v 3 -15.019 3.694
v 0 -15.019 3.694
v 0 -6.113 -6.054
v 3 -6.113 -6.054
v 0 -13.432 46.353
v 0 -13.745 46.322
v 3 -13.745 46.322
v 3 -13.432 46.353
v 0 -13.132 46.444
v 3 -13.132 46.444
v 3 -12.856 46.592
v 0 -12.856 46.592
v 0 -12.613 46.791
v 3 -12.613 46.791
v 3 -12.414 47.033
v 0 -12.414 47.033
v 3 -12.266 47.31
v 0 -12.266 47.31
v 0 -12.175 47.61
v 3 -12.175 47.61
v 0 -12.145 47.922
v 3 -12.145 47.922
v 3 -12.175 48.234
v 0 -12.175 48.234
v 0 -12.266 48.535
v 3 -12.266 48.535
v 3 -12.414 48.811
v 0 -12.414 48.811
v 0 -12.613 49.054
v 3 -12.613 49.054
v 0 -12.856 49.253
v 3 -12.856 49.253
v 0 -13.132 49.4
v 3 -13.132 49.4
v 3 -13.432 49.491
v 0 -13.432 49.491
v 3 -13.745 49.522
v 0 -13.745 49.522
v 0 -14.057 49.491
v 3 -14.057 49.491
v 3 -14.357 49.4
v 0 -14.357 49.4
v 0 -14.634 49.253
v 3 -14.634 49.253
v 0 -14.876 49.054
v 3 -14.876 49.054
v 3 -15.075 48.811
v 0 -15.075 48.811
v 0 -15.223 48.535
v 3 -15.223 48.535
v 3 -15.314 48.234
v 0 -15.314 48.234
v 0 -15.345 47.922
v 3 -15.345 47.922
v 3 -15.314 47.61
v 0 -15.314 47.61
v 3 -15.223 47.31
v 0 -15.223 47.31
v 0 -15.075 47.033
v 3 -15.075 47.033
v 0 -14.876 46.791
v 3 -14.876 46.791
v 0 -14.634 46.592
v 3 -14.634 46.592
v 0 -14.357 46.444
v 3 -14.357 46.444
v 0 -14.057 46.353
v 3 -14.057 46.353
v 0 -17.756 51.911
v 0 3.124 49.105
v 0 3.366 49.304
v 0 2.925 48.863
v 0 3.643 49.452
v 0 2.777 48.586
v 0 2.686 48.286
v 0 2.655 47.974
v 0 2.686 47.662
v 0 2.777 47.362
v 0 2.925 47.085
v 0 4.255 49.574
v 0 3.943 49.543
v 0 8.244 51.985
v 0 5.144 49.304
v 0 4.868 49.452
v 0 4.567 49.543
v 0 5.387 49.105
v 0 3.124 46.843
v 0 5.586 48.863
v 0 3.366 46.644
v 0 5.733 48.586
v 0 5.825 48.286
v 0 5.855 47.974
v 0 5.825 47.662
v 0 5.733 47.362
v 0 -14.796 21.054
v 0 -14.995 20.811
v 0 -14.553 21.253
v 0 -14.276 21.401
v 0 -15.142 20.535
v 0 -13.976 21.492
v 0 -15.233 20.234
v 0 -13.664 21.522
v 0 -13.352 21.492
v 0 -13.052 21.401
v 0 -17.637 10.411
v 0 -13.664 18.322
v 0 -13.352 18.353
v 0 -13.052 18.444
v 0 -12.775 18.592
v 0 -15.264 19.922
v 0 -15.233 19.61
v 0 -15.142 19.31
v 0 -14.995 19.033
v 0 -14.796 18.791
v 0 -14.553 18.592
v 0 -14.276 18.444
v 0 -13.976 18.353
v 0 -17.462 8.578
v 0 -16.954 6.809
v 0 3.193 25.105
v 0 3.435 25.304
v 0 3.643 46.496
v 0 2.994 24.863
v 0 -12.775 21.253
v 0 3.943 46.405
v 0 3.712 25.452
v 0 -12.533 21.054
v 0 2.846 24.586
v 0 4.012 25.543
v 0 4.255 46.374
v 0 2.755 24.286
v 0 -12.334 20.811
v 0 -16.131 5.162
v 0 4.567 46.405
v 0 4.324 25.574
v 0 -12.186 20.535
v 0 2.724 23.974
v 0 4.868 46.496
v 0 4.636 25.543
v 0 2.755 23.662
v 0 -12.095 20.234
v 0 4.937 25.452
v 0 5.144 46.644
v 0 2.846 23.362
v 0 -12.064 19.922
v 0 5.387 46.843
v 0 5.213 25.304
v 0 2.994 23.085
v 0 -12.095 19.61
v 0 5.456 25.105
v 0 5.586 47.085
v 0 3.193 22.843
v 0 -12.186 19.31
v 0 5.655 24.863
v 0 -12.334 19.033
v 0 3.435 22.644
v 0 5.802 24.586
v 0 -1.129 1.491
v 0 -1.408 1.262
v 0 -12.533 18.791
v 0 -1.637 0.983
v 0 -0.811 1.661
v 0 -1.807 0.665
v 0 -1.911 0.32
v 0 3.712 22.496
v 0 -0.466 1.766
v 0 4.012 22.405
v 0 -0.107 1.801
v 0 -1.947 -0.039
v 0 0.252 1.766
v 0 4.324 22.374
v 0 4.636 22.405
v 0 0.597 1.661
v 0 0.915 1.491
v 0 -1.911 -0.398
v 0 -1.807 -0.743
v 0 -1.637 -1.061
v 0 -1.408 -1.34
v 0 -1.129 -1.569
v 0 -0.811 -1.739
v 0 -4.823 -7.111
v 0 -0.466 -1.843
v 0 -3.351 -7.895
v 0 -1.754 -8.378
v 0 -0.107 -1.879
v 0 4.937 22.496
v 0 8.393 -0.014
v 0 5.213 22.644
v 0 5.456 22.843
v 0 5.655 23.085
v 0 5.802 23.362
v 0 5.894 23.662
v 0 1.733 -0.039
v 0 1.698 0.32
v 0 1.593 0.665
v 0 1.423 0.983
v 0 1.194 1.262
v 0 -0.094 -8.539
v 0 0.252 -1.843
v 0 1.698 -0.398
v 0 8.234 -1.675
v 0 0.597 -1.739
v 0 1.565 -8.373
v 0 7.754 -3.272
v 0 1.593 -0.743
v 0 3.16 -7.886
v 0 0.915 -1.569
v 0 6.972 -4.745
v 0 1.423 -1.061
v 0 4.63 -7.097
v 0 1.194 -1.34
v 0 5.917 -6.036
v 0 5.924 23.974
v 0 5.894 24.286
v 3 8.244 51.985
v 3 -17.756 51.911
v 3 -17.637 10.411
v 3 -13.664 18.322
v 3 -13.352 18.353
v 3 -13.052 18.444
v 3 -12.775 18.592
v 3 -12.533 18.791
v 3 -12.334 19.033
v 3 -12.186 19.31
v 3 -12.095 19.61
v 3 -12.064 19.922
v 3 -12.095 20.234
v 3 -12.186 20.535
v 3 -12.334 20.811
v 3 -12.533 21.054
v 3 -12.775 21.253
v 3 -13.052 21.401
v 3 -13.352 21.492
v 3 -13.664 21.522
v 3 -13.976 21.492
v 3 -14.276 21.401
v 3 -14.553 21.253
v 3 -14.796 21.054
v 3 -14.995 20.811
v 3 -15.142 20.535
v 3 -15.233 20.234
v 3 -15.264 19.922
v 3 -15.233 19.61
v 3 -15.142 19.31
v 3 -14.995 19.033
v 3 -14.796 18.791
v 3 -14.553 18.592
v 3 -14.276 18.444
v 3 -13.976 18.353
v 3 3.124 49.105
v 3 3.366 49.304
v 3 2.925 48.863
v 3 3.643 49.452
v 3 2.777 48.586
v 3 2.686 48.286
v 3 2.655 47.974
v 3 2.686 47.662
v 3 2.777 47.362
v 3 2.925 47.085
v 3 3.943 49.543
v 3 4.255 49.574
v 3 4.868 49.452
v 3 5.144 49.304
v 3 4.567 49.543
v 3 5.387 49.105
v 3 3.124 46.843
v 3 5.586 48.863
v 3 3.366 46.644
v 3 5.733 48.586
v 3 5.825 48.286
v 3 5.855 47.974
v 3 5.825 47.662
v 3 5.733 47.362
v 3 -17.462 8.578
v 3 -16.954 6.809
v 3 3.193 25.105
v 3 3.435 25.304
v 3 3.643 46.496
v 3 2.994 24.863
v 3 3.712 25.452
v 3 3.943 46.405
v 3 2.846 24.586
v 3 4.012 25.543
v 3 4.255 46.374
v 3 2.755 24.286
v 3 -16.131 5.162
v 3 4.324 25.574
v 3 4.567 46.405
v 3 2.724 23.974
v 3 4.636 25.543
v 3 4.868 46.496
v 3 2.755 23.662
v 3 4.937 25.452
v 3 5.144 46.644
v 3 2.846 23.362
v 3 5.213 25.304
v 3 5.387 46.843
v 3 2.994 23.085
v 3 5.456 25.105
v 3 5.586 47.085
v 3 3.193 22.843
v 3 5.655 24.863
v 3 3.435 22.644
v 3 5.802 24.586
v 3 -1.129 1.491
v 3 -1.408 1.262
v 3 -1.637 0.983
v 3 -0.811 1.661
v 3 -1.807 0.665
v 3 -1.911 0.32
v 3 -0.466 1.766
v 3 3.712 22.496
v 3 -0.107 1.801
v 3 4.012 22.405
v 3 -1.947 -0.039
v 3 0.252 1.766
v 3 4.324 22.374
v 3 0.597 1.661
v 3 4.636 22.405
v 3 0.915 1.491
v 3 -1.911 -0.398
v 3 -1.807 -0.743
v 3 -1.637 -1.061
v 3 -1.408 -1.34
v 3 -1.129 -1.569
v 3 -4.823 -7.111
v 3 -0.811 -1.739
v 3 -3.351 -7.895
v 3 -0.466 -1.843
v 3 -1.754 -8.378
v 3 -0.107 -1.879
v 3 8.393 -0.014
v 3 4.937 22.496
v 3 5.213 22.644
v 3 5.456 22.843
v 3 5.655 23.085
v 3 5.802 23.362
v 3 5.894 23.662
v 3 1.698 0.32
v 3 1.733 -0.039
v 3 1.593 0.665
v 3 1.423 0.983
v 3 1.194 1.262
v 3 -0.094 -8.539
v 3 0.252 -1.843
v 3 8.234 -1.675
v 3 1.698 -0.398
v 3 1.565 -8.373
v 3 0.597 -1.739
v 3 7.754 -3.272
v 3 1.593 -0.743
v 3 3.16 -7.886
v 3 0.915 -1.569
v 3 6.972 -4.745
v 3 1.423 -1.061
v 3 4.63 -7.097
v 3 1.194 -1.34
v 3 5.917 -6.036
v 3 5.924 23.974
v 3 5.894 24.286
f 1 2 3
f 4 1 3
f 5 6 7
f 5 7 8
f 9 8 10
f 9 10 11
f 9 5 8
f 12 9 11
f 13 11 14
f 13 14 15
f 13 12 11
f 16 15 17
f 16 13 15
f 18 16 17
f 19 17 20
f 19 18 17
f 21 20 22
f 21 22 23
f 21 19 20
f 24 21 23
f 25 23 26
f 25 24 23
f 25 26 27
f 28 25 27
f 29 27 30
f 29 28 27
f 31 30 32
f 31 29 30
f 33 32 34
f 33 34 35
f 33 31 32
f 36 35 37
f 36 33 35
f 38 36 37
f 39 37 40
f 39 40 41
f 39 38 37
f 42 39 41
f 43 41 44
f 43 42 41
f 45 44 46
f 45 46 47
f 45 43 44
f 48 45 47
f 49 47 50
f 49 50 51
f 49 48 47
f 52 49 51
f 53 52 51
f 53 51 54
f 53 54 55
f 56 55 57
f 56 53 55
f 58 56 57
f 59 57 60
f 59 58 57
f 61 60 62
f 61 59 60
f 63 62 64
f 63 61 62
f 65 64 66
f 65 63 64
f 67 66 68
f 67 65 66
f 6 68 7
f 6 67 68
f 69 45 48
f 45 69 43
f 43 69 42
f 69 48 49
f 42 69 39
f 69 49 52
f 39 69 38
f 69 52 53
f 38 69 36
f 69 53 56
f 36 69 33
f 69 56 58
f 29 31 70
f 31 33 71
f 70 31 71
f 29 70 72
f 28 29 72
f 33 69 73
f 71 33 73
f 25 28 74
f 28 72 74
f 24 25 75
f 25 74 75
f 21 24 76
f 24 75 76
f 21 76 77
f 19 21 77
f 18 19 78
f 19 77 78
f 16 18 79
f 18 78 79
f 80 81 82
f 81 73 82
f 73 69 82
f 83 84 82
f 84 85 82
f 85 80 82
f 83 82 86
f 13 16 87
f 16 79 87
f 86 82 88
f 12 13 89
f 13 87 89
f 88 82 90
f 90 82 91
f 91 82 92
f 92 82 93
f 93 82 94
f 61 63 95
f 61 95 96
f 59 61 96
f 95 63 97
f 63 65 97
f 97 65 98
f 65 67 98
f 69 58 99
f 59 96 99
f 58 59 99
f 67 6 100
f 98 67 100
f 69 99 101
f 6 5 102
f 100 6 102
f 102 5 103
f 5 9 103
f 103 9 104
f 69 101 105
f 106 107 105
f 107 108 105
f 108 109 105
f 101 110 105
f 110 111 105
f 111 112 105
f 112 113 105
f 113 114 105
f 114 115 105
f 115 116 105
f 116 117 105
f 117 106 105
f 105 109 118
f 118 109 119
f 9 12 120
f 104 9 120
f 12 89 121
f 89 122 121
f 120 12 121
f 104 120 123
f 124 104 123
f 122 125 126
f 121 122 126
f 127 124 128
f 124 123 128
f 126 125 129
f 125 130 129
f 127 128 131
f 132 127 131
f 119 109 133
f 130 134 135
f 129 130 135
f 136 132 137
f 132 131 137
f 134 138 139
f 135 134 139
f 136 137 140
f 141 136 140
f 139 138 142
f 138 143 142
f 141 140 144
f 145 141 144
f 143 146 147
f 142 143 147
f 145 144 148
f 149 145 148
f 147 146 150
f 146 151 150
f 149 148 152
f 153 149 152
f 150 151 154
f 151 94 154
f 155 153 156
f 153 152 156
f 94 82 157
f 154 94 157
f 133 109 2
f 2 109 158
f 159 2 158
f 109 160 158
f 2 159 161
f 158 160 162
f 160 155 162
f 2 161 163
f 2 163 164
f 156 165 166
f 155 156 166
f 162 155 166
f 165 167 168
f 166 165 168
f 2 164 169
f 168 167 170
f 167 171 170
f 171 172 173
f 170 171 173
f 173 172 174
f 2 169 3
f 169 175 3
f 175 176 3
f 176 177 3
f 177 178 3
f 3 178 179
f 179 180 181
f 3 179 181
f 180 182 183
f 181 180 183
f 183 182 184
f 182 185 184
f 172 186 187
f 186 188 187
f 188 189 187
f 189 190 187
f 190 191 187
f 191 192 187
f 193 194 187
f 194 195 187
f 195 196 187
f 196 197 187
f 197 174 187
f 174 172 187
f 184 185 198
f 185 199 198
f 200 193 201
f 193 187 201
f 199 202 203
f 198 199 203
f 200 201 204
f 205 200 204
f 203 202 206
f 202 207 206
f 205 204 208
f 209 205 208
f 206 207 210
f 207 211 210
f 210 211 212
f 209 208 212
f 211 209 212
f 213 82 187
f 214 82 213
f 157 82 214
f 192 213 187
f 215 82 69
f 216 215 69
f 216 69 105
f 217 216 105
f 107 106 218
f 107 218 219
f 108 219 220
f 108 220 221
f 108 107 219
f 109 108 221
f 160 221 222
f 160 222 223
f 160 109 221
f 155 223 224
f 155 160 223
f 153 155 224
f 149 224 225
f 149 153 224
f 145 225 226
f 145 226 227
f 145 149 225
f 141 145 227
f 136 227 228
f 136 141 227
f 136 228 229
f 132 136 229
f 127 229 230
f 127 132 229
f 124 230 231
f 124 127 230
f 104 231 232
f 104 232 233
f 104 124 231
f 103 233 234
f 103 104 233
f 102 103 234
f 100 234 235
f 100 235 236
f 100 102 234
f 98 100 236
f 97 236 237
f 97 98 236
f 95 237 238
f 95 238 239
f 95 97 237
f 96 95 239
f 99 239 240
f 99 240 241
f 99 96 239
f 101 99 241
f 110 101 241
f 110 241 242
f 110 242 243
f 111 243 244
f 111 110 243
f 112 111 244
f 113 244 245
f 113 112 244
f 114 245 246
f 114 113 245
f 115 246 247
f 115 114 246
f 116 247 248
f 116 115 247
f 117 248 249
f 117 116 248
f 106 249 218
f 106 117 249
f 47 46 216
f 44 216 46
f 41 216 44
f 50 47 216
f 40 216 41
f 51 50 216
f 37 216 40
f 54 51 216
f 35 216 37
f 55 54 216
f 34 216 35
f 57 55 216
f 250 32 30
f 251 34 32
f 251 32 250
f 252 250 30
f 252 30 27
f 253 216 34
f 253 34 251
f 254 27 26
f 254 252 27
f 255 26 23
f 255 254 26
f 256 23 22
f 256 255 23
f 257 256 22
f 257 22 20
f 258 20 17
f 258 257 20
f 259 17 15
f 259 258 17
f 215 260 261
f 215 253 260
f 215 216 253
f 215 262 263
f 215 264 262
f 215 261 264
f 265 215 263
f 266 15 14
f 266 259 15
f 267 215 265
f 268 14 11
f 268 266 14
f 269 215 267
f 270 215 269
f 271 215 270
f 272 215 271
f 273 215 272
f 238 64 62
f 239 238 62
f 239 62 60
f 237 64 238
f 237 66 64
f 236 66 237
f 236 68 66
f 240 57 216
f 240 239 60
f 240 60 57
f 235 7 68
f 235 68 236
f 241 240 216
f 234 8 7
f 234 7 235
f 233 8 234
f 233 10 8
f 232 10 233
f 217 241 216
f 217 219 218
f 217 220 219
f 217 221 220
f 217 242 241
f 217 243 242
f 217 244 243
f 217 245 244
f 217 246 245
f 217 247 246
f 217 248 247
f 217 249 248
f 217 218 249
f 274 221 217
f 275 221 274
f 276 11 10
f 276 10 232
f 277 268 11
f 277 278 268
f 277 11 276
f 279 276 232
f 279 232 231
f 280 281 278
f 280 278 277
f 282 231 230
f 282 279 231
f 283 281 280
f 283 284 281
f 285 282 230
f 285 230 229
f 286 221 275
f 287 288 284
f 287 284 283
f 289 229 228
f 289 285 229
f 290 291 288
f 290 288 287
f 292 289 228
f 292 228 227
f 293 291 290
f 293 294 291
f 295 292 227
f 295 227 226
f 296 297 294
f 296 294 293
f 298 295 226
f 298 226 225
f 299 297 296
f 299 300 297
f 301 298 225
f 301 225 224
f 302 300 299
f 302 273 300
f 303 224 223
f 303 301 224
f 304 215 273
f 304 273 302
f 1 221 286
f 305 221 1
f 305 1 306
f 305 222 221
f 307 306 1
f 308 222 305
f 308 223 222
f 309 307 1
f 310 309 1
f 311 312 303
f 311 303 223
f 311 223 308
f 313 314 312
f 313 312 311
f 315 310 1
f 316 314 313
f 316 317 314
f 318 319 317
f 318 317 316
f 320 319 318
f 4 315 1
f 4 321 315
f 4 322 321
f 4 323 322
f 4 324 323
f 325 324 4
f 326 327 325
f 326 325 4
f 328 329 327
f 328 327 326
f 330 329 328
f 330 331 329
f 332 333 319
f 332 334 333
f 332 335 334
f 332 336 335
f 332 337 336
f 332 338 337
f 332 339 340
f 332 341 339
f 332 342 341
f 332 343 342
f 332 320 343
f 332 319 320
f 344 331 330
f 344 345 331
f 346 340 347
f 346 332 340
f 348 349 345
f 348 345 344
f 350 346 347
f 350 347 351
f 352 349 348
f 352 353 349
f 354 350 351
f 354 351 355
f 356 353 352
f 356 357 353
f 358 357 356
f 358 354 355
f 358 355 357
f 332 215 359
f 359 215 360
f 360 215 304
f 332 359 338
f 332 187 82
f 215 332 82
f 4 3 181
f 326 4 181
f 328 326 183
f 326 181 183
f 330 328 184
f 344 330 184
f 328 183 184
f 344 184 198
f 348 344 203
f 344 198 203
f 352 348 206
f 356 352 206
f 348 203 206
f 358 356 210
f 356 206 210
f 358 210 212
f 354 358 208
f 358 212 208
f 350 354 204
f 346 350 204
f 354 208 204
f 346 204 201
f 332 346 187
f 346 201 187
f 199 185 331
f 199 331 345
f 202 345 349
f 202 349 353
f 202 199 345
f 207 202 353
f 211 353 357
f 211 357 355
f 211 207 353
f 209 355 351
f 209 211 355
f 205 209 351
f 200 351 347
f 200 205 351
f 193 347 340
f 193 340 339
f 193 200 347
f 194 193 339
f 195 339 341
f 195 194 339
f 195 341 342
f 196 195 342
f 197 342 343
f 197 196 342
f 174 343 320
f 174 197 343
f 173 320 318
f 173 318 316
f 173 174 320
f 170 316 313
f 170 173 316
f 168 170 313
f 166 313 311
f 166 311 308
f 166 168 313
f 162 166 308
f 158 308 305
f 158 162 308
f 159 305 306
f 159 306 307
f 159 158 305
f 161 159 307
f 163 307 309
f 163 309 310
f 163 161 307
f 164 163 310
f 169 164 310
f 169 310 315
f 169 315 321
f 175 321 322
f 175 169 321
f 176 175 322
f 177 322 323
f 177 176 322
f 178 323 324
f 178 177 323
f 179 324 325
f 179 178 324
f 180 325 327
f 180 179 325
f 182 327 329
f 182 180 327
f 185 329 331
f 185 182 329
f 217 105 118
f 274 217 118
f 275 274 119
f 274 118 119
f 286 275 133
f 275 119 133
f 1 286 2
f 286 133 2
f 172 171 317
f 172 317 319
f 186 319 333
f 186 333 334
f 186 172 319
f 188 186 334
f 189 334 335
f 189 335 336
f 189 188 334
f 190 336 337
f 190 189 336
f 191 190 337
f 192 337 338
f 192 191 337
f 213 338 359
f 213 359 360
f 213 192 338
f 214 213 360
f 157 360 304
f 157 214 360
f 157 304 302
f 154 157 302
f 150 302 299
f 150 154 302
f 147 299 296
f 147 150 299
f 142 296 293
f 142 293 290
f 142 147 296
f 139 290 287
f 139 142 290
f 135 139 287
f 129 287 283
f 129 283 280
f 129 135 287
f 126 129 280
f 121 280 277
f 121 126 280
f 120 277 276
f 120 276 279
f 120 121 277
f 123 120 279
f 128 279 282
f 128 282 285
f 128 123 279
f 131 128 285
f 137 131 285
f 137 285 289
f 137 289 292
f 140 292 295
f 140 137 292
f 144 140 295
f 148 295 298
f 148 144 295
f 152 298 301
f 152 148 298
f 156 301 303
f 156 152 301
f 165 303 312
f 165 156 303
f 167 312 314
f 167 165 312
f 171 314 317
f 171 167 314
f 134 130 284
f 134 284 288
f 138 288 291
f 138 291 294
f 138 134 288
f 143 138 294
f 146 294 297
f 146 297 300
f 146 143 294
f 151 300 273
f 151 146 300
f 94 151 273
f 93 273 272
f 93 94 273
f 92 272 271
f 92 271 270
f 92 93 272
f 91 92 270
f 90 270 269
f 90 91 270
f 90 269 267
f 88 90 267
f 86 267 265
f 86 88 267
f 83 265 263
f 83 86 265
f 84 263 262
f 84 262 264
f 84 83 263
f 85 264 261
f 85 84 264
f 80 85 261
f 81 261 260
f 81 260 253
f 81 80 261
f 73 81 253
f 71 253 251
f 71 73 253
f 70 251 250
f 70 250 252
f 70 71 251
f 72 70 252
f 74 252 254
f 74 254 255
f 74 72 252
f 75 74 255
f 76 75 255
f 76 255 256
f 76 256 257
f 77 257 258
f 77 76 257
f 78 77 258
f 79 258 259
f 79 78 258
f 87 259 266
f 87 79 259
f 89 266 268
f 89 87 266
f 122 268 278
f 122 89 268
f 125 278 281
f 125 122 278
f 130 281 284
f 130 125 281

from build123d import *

# Parameters (mm, degrees)
SKETCH_1_R      = 1.839883841
SKETCH_1_R_2    = 1.6
EXTRUDE_1_DEPTH = 3


with BuildPart() as part:
    # 草图1 → 凸台-拉伸1 (new body)
    with BuildSketch(Plane(origin=(0, 0, 0), x_dir=(0, 0, -1), z_dir=(1, 0, 0))):
        with BuildLine():
            Line((-51.910708478, -17.756118332), (-10.410879829, -17.636861799))
            ThreePointArc((-10.410879829, -17.636861799), (-6.80853031, -16.954371319), (-3.69429735, -15.01936011))
            Line((-3.69429735, -15.01936011), (6.053738335, -6.112622142))
            ThreePointArc((6.053738335, -6.112622142), (7.885847556, 3.160295303), (0.014361881, 8.393204188))
            Line((0.014361881, 8.393204188), (-51.985423414, 8.243774315))
            Line((-51.985423414, 8.243774315), (-51.910708478, -17.756118332))
        make_face()
        with Locations((0.038787918, -0.106760716)):
            Circle(SKETCH_1_R, mode=Mode.SUBTRACT)
        with Locations((-47.973945324, 4.255285437)):
            Circle(SKETCH_1_R_2, mode=Mode.SUBTRACT)
        with Locations((-19.92233521, -13.664178003)):
            Circle(SKETCH_1_R_2, mode=Mode.SUBTRACT)
        with Locations((-23.974044419, 4.32425307)):
            Circle(SKETCH_1_R_2, mode=Mode.SUBTRACT)
        with Locations((-47.922219599, -13.744640242)):
            Circle(SKETCH_1_R_2, mode=Mode.SUBTRACT)
    extrude(amount=EXTRUDE_1_DEPTH)


solid = part.part
